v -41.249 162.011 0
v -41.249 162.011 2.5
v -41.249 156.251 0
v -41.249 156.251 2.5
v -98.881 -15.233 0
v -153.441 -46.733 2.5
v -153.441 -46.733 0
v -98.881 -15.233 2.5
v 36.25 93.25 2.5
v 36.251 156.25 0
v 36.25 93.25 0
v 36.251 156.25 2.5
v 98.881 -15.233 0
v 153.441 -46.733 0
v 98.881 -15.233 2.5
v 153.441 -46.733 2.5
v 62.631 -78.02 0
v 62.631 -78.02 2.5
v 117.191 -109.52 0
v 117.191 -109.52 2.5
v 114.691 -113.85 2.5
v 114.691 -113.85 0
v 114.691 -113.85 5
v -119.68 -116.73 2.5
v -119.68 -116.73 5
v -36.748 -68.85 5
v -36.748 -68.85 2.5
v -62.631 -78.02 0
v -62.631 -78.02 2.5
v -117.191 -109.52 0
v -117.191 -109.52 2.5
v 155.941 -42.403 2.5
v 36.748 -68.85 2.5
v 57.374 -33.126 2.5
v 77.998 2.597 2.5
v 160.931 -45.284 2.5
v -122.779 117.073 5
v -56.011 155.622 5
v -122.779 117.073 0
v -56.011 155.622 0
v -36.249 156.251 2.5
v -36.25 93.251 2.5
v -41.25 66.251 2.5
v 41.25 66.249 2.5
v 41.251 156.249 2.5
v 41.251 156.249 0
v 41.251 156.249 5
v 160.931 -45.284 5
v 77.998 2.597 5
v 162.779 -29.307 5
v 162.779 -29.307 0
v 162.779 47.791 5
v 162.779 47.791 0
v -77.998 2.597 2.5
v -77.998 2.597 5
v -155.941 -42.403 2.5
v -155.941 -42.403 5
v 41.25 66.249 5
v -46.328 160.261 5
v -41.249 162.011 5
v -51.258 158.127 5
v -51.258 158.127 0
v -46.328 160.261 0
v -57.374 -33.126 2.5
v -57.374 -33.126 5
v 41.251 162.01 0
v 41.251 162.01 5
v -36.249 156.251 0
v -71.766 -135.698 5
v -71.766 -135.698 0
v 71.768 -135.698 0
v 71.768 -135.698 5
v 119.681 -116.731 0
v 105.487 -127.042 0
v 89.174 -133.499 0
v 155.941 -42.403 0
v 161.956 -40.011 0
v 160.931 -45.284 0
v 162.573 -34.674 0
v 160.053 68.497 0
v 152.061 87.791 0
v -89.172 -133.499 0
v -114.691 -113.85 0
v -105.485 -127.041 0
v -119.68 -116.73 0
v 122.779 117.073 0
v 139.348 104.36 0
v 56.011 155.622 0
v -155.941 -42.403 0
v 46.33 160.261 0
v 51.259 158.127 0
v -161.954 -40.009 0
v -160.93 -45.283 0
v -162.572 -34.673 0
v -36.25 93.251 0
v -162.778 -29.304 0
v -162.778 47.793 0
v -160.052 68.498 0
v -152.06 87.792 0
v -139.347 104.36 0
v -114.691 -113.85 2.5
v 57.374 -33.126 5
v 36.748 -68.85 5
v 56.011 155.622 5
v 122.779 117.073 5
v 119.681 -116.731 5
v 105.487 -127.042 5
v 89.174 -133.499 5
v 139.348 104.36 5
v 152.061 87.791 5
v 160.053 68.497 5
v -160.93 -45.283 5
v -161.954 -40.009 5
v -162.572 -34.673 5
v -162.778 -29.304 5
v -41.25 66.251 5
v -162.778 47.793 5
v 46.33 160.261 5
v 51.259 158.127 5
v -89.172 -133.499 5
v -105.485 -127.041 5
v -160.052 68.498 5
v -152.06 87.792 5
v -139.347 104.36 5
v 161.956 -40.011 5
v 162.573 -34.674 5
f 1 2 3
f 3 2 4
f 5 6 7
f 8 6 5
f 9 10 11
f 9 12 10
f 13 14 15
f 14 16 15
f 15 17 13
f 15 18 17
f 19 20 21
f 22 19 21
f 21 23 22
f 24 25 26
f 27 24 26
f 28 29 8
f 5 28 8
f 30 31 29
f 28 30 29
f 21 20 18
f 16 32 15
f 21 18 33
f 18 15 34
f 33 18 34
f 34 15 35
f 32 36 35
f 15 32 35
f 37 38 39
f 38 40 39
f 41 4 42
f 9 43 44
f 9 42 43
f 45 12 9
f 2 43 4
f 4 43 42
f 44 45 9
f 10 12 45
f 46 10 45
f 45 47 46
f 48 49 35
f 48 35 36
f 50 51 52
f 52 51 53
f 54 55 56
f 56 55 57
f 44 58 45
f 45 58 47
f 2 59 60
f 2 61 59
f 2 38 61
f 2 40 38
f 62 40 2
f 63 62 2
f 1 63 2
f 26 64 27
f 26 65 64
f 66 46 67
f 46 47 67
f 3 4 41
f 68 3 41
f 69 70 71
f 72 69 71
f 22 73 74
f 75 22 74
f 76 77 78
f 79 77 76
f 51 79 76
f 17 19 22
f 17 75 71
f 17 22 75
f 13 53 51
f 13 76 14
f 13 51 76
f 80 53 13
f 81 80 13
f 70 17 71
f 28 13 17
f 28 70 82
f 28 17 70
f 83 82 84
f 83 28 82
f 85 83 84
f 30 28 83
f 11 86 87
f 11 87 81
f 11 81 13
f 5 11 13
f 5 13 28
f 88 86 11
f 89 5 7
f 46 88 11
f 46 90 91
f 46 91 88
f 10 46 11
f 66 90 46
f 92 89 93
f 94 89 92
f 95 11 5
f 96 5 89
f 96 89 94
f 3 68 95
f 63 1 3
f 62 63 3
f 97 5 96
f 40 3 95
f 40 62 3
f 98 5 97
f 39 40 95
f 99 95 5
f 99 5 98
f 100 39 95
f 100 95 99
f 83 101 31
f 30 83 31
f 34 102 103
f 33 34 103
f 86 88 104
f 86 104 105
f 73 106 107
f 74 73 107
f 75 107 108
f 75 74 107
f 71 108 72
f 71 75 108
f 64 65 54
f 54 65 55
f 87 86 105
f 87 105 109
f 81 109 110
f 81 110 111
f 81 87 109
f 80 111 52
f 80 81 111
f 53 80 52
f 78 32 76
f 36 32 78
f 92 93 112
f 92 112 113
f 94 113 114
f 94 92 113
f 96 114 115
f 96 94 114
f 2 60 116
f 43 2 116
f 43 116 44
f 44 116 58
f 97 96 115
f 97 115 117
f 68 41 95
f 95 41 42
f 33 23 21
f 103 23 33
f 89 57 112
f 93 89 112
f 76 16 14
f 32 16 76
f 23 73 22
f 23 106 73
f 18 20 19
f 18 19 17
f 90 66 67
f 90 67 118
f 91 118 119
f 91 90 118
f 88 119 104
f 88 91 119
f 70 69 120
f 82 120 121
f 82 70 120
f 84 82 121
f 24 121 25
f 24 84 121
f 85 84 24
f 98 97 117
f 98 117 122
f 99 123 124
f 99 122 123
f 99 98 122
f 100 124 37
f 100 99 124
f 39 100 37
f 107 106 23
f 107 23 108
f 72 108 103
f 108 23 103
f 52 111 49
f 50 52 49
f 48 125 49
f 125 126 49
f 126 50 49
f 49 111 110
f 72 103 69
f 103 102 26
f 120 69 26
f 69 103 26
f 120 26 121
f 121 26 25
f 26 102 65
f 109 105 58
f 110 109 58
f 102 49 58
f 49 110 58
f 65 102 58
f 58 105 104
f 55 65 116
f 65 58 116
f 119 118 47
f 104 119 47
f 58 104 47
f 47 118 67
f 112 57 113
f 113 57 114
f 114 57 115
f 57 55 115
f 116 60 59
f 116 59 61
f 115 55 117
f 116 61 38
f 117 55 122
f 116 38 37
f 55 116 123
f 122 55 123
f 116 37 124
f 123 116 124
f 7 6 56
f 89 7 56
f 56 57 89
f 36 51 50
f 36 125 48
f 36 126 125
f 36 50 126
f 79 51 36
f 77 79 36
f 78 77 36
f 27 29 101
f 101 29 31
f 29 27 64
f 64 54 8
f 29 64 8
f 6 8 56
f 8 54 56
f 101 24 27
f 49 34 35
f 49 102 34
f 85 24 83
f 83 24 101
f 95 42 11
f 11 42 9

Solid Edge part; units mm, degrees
sketch "Sketch1" plane through (0, 0, 0) normal (0, 0, 1) x (1, 0, 0)
  line L0 (56.0106, 155.6218) -> (122.779, 117.073)
  arc A0 (122.779, 117.073) -> (162.779, 47.791) centre (82.779, 47.791) cw
  line L1 (162.779, -29.3066) -> (162.779, 47.791)
  arc A1 (153.4008, -64.3066) -> (162.779, -29.3066) centre (92.779, -29.3066) ccw
  line L2 (142.8955, -82.5023) -> (153.4008, -64.3066)
  line L3 (142.8955, -82.5023) -> (132.3902, -100.698)
  arc A2 (132.3902, -100.698) -> (106.7685, -126.3198) centre (71.7685, -65.698) cw
  arc A3 (106.7685, -126.3198) -> (71.7685, -135.698) centre (71.7685, -65.698) cw
  line L4 (-71.7658, -135.698) -> (71.7685, -135.698)
  arc A4 (-106.7658, -126.3198) -> (-71.7658, -135.698) centre (-71.7658, -65.698) ccw
  arc A5 (-132.3876, -100.698) -> (-106.7658, -126.3198) centre (-71.7658, -65.698) ccw
  line L5 (-153.3995, -64.3043) -> (-132.3876, -100.698)
  arc A6 (-153.3995, -64.3043) -> (-162.7777, -29.3043) centre (-92.7777, -29.3043) cw
  line L6 (-162.7777, -29.3043) -> (-162.7777, 47.7933)
  arc A7 (-122.779, 117.073) -> (-162.7777, 47.7933) centre (-82.7804, 47.7933) ccw
  line L7 (-56.0106, 155.6218) -> (-122.779, 117.073)
  arc A8 (-21.0106, 165) -> (-56.0106, 155.6218) centre (-21.0106, 95) ccw
  line L8 (0, 165) -> (-21.0106, 165)
  line L9 (0, 165) -> (21.0106, 165)
  arc A9 (21.0106, 165) -> (56.0106, 155.6218) centre (21.0106, 95) cw
extrude "Protrusion1" add sketch "Sketch1" along normal blind 5
sketch "Sketch2" plane through (0.0007, 14.651, 5) normal (0, 0, 1) x (1, 0, 0)
  line L0 (-57.3742, -47.7772) -> (-36.7492, -83.5007)
  line L1 (-140.6722, -143.5007) -> (-36.7492, -83.5007)
  line L2 (-181.9222, -72.0536) -> (-140.6722, -143.5007)
  line L3 (-77.9992, -12.0536) -> (-181.9222, -72.0536)
  line L4 (-57.3742, -47.7772) -> (-77.9992, -12.0536)
  line L5 (140.6709, -143.5007) -> (36.7478, -83.5007)
  line L6 (57.3728, -47.7772) -> (36.7478, -83.5007)
  line L7 (57.3728, -47.7772) -> (77.9978, -12.0536)
  line L8 (77.9978, -12.0536) -> (181.9209, -72.0536)
  line L9 (181.9209, -72.0536) -> (140.6709, -143.5007)
  line L10 (-0.001, 51.599) -> (41.249, 51.5984)
  line L11 (41.249, 51.5984) -> (41.2508, 171.5984)
  line L12 (41.2508, 171.5984) -> (-41.2492, 171.5996)
  line L13 (-41.2492, 171.5996) -> (-41.251, 51.5996)
  line L14 (-0.001, 51.599) -> (-41.251, 51.5996)
extrude "ExtrudedCutout_4" cut sketch "Sketch2" against normal blind 2.5
sketch "Sketch3" plane through (0.0007, 14.651, 5) normal (0, 0, 1) x (1, 0, 0)
  line L0 (-62.6319, -92.6706) -> (-98.8819, -29.8837)
  line L1 (-153.4415, -61.3837) -> (-98.8819, -29.8837)
  line L2 (-153.4415, -61.3837) -> (-155.9415, -57.0536)
  line L3 (-155.9415, -57.0536) -> (-181.9222, -72.0536)
  line L4 (-181.9222, -72.0536) -> (-140.6722, -143.5007)
  line L5 (-140.6722, -143.5007) -> (-114.6915, -128.5007)
  line L6 (-114.6915, -128.5007) -> (-117.1915, -124.1706)
  line L7 (-117.1915, -124.1706) -> (-62.6319, -92.6706)
extrude "ExtrudedCutout_5" cut sketch "Sketch3" against normal blind 5
sketch "Sketch4" plane through (0.0007, 14.651, 5) normal (0, 0, 1) x (1, 0, 0)
  line L0 (41.2504, 141.5984) -> (41.2508, 171.5984)
  line L1 (41.2508, 171.5984) -> (-41.2492, 171.5996)
  line L2 (-41.2492, 171.5996) -> (-41.2496, 141.5996)
  line L3 (-41.2496, 141.5996) -> (-36.2496, 141.5996)
  line L4 (-36.2496, 141.5996) -> (-36.2506, 78.5996)
  line L5 (-36.2506, 78.5996) -> (36.2494, 78.5985)
  line L6 (36.2504, 141.5985) -> (36.2494, 78.5985)
  line L7 (36.2504, 141.5985) -> (41.2504, 141.5984)
  line L8 (153.4401, -61.3837) -> (98.8805, -29.8837)
  line L9 (62.6305, -92.6706) -> (98.8805, -29.8837)
  line L10 (117.1901, -124.1706) -> (62.6305, -92.6706)
  line L11 (117.1901, -124.1706) -> (114.6901, -128.5007)
  line L12 (140.6709, -143.5007) -> (114.6901, -128.5007)
  line L13 (181.9209, -72.0536) -> (140.6709, -143.5007)
  line L14 (155.9401, -57.0536) -> (181.9209, -72.0536)
  line L15 (153.4401, -61.3837) -> (155.9401, -57.0536)
extrude "ExtrudedCutout_6" cut sketch "Sketch4" against normal blind 5
properties material "Polycarbonate"
